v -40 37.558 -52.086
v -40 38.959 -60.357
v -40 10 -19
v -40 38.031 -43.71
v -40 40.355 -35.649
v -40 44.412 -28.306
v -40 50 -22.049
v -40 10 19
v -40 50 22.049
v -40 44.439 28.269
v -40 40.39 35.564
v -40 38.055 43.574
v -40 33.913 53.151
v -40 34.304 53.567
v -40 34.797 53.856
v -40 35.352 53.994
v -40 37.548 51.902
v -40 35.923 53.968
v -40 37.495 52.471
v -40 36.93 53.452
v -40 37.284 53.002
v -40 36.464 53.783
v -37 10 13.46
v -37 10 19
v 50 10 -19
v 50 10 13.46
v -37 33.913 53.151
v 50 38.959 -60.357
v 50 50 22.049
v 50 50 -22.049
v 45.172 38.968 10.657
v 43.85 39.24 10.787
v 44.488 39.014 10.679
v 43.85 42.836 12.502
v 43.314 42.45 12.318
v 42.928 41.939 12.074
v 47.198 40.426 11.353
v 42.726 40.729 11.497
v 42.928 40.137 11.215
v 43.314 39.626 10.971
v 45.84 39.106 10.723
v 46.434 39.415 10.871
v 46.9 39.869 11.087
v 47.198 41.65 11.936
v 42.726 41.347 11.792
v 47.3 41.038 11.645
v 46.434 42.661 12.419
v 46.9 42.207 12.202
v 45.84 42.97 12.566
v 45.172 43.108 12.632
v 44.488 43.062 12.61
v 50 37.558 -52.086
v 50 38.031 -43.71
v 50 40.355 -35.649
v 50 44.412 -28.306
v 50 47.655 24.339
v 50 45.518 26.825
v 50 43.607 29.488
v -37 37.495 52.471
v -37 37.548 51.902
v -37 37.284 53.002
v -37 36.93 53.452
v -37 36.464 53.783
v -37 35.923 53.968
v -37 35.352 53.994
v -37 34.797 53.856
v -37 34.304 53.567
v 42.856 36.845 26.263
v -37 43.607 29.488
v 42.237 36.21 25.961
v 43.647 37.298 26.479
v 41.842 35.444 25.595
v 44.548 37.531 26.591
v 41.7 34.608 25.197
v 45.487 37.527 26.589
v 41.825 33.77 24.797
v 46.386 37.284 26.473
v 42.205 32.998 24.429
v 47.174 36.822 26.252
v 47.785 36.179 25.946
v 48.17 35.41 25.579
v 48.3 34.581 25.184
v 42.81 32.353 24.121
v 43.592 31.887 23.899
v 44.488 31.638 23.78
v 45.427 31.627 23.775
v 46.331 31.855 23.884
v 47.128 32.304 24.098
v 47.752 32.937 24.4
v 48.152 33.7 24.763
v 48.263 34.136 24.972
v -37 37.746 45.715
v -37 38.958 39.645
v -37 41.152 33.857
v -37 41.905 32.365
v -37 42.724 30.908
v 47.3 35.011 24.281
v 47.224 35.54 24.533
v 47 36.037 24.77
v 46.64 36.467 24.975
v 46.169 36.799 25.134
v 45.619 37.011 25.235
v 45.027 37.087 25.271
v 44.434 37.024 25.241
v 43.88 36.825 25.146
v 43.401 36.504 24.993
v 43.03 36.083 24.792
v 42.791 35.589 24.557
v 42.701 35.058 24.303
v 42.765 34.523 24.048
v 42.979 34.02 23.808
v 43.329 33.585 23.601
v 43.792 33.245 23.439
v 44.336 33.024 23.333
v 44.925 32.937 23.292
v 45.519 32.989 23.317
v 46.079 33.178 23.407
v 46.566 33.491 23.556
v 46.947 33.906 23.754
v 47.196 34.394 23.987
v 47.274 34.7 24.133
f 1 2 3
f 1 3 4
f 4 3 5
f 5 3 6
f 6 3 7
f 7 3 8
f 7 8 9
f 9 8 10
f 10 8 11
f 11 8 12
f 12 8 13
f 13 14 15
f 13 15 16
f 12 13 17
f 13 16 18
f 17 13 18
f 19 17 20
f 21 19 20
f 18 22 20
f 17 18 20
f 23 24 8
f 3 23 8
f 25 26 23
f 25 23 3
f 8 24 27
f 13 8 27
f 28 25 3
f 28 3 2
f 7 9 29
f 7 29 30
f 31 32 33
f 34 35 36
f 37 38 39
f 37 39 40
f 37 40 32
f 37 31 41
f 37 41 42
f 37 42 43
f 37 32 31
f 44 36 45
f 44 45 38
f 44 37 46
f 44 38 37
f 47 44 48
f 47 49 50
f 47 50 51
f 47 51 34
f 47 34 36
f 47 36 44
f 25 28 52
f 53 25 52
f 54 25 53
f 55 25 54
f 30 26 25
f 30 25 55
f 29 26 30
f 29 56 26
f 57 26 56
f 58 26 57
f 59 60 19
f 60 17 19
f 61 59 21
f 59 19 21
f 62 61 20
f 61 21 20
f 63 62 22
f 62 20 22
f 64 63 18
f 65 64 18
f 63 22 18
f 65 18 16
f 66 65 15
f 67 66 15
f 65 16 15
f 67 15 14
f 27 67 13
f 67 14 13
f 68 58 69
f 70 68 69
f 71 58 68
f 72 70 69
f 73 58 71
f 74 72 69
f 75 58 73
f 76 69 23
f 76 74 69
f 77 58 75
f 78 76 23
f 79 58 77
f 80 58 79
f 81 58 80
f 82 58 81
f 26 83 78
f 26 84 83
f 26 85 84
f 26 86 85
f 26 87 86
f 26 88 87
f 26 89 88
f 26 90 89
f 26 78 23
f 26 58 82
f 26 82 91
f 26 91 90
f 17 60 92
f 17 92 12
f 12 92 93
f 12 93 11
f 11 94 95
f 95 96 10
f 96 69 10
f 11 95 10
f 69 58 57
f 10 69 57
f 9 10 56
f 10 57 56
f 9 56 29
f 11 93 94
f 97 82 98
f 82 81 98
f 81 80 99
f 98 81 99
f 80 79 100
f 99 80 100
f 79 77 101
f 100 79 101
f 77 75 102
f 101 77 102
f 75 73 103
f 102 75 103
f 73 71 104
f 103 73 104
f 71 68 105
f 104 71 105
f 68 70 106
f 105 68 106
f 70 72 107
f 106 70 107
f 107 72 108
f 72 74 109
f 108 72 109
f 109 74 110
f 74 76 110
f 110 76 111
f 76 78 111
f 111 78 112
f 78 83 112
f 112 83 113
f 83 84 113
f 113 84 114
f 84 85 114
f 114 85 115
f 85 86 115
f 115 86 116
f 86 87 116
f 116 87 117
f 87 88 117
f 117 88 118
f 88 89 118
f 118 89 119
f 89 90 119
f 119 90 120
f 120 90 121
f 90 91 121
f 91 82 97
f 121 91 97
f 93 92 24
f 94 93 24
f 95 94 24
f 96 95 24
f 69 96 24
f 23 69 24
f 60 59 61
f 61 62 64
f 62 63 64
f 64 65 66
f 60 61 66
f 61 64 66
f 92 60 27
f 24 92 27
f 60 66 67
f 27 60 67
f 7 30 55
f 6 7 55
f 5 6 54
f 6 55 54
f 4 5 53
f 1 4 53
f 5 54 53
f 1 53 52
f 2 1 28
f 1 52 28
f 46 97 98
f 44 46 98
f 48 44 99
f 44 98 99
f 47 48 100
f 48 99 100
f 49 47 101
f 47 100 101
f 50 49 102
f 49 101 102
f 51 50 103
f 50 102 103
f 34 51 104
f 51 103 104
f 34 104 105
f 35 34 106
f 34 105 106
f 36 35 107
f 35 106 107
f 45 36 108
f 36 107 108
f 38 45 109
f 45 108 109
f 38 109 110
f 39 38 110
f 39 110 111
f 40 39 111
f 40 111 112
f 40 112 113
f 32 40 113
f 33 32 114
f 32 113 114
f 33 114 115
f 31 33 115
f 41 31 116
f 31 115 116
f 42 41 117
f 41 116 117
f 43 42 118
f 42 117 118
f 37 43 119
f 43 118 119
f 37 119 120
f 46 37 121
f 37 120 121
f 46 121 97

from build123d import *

# Parameters (mm, degrees)
PAD029_DEPTH         = 50
PAD029_DEPTH_BACK    = 40
POCKET025_DEPTH      = 37
POCKET025_DEPTH_BACK = 100
FILLET018_R          = 2
SKETCH057_R          = 2.3
POCKET026_DEPTH      = 15
CHAMFER013_SIZE      = 1


with BuildPart() as part:
    # Sketch055 → Pad029 (new body, two sides)
    with BuildSketch(Plane.YZ) as pad029_sk:
        with BuildLine():
            Line((0, 19), (0, -19))
            Line((0, -19), (28.9586804597, -60.3572817765))
            ThreePointArc((40, -22.0491502813), (28.9668360053, -39.6143804936), (28.9586804597, -60.3572817765))
            Line((40, 22.0491502813), (40, -22.0491502813))
            ThreePointArc((28.9586804597, 60.3572817765), (28.9668360053, 39.6143804936), (40, 22.0491502813))
            Line((0, 19), (28.9586804597, 60.3572817765))
        make_face()
    extrude(amount=PAD029_DEPTH)
    extrude(pad029_sk.sketch, amount=-PAD029_DEPTH_BACK)

    # Sketch056 → Pocket025 (cut, two sides)
    with BuildSketch(Plane.YZ) as pocket025_sk:
        with BuildLine():
            ThreePointArc((28.9586804597, 60.3572817765), (27.6278296398, 46.9063156967), (31.1523619549, 33.8572803169))
            ThreePointArc((31.1523619549, 33.8572803169), (32.3065923695, 31.6317911188), (33.6069416835, 29.4883962222))
            Line((33.6069416835, 29.4883962222), (0, 13.4604701885))
            Line((0, 13.4604701885), (0, 19))
            Line((0, 19), (28.9586804597, 60.3572817765))
        make_face()
    extrude(amount=-POCKET025_DEPTH, mode=Mode.SUBTRACT)
    extrude(pocket025_sk.sketch, amount=POCKET025_DEPTH_BACK, mode=Mode.SUBTRACT)

    # Fillet018
    fillet018_edges = [part.edges().sort_by_distance(p)[0] for p in [
        (-38.5, 28.95868, 60.357282),
    ]]
    fillet(fillet018_edges, radius=FILLET018_R)

    # Sketch057 → Pocket026 (cut)
    with BuildSketch(Plane(origin=(0, -5.2300130023, 10.9661562951), x_dir=(1, 0, 0), z_dir=(0, -0.4304725249, 0.9026036812))):
        with Locations((45, 33.027693654)):
            Circle(SKETCH057_R)
    extrude(amount=-POCKET026_DEPTH, mode=Mode.SUBTRACT)

    # Chamfer013
    chamfer013_edges = [part.edges().sort_by_distance(p)[0] for p in [
        (42.7, 24.580905, 25.183671),
    ]]
    chamfer(chamfer013_edges, length=CHAMFER013_SIZE)


with BuildPart() as part_1:
    # Body029 placement: moved
    add(part.part.moved(Location((0, 10, 0))))


solid = part_1.part
